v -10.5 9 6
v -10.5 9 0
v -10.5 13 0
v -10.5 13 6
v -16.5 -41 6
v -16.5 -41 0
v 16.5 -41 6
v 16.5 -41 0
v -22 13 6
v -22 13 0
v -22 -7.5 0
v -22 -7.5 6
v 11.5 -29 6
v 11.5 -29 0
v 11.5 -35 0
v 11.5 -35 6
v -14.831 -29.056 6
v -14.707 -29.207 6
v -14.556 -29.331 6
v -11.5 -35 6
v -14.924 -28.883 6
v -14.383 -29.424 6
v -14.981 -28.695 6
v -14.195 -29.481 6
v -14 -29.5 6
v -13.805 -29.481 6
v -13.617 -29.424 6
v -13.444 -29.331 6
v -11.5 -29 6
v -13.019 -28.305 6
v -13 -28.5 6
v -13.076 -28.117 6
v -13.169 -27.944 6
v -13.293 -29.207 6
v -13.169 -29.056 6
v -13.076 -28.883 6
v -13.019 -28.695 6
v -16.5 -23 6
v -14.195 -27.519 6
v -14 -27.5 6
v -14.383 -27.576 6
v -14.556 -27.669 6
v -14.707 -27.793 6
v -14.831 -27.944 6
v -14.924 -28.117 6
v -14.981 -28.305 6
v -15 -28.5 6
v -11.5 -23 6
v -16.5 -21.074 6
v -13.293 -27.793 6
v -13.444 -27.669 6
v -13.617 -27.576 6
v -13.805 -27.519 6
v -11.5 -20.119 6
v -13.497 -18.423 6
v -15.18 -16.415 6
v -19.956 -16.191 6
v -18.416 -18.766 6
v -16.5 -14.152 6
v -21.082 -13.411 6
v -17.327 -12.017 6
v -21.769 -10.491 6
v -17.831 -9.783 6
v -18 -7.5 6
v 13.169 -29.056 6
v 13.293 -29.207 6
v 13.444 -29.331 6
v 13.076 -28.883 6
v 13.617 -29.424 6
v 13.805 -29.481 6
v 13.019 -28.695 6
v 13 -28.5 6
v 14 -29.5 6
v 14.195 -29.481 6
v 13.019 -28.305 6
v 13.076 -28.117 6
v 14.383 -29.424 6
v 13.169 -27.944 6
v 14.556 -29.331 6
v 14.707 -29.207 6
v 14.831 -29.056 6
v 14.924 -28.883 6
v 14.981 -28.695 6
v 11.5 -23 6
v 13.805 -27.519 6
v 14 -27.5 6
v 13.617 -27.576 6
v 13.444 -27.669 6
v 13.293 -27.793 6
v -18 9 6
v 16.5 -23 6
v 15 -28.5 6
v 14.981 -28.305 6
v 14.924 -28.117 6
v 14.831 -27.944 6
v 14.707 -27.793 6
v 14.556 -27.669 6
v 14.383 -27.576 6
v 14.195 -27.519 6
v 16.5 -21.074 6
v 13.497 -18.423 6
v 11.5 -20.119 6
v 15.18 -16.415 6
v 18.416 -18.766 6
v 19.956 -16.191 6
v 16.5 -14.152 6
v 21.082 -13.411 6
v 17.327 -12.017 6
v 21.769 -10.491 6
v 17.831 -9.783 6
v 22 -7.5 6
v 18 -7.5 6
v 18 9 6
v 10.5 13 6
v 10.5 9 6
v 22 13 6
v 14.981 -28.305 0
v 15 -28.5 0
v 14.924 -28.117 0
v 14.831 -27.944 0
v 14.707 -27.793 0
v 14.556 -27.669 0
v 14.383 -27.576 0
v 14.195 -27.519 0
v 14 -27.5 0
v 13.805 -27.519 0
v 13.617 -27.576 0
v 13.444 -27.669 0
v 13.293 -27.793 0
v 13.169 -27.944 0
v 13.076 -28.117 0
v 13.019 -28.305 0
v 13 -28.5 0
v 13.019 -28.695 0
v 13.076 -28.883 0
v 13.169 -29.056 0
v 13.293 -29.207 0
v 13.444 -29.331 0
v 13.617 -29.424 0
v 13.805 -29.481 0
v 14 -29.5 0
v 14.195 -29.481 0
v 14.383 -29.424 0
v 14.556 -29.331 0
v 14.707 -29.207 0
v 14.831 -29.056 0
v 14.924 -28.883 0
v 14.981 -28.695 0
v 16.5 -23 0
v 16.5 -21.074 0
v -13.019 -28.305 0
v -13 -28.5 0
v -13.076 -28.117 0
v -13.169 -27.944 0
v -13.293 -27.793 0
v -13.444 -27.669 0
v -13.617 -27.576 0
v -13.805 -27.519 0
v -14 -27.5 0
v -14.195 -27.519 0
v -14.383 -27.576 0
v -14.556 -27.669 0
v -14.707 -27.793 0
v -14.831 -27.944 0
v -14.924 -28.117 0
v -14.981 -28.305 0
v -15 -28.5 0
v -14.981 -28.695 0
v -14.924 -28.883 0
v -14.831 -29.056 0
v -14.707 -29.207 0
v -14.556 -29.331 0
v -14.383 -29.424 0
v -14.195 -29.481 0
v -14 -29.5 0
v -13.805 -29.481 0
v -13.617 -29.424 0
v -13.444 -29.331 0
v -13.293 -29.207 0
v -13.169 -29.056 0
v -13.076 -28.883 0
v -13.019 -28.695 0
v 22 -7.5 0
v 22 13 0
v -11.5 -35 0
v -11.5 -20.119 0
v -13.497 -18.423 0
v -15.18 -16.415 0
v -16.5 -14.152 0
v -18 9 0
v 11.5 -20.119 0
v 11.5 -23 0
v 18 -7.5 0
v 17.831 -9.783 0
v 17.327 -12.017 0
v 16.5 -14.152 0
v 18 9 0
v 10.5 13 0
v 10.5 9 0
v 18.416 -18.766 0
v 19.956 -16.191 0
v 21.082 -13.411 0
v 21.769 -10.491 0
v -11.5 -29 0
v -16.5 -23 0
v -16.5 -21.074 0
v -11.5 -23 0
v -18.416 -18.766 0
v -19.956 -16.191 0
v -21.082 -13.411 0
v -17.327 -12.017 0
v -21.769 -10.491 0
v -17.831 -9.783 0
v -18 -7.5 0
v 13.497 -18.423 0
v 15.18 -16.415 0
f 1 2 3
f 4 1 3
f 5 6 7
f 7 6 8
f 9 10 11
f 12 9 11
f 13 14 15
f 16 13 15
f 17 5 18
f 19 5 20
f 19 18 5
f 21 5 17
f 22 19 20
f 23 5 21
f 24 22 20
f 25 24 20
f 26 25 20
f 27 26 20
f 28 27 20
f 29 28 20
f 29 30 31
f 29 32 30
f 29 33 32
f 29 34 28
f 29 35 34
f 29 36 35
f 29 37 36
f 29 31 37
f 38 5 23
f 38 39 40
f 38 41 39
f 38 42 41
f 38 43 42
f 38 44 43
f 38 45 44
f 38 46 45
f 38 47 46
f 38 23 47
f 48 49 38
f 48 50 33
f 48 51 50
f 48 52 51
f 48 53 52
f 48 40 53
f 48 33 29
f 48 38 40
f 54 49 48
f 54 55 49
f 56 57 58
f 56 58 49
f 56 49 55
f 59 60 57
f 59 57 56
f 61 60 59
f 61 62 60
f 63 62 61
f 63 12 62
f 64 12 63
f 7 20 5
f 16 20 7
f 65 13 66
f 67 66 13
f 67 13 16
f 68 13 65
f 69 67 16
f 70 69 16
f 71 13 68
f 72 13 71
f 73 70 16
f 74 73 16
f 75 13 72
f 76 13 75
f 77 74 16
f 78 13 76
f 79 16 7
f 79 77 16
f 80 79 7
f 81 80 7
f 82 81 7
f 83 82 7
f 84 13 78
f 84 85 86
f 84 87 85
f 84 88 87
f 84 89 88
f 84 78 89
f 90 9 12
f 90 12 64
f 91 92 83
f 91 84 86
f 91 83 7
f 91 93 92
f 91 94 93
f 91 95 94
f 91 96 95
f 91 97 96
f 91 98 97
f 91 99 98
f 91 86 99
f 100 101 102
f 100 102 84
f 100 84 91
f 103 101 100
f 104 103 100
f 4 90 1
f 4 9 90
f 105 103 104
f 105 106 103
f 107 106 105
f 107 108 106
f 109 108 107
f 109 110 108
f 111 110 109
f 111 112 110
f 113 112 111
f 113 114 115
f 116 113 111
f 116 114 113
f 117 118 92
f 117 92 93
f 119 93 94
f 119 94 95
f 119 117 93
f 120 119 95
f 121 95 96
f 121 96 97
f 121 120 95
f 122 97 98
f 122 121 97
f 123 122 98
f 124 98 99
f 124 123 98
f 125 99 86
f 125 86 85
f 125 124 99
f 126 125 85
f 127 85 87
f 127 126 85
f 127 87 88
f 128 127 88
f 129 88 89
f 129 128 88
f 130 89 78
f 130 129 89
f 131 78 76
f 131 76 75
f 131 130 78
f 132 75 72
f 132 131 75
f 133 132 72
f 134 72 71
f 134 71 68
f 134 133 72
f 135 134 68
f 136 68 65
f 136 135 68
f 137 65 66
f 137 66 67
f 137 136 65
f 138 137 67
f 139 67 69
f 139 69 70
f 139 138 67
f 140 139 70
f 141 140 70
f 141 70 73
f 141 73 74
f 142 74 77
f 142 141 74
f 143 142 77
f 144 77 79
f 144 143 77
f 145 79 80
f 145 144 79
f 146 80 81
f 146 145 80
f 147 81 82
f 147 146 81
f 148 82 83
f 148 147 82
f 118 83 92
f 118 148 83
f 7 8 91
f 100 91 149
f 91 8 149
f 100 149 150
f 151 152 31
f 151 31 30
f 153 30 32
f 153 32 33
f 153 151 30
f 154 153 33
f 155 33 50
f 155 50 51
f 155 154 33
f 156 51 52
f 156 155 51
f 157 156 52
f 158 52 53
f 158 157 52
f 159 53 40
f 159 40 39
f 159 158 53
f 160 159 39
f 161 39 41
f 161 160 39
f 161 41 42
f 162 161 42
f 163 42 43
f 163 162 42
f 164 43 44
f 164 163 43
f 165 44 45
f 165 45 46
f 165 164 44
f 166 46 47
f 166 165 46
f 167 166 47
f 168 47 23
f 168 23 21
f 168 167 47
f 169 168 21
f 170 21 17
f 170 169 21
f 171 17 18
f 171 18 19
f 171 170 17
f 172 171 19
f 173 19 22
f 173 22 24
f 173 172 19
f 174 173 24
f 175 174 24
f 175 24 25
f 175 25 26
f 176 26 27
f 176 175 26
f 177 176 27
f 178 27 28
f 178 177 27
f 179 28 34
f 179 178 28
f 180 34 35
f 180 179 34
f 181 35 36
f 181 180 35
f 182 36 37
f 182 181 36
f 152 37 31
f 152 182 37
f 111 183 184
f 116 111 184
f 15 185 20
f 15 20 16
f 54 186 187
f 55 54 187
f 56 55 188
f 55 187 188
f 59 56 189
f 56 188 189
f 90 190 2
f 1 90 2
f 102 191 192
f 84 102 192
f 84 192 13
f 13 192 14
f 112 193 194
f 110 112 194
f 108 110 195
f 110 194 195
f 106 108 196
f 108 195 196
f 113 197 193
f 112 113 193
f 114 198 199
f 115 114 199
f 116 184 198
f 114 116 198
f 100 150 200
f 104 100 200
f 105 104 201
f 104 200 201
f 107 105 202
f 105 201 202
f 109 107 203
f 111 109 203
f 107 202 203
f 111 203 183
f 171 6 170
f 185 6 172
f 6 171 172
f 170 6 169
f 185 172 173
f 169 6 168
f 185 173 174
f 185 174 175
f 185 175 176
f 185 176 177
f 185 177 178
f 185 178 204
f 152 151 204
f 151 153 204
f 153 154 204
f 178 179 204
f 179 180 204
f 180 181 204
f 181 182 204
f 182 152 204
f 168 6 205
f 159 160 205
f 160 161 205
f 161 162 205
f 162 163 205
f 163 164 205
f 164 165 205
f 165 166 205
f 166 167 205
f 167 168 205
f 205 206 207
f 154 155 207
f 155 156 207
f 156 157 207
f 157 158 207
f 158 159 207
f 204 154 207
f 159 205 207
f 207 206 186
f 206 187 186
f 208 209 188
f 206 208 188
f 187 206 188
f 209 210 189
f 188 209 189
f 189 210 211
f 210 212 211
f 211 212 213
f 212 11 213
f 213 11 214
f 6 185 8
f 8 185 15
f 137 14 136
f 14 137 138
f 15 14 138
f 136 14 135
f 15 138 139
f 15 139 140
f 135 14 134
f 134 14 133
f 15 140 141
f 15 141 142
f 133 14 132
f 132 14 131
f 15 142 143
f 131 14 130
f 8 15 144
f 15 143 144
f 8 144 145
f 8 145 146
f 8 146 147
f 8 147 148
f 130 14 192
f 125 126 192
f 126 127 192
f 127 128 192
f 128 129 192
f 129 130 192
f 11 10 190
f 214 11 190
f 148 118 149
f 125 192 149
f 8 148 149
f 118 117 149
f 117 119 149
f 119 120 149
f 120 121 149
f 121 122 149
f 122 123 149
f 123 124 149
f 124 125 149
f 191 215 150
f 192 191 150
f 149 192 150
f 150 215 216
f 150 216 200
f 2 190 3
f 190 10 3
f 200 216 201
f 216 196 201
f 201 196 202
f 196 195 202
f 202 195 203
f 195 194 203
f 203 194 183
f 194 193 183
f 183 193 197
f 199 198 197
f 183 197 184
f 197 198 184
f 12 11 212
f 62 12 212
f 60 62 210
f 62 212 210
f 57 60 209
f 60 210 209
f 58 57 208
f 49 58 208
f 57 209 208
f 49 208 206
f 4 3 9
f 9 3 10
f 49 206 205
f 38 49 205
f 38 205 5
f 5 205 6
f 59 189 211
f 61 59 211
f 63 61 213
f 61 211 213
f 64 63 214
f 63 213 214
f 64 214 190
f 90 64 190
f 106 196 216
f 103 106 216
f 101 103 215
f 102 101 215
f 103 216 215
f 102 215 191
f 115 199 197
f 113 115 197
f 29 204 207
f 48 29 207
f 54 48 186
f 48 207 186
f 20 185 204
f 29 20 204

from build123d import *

# Parameters (mm, degrees)
F0_R     = 1
F0_W     = 23
F0_H     = 6
F1_DEPTH = 6


# Not quite as in the source:
# - a feature names something its author has since deleted; it is built from what else it names


with BuildPart() as f1:
    # F0 (on Top) → F1 (new body)
    with BuildSketch(Plane.XY):
        with BuildLine():
            Line((-16.5, -21.0738723458), (-16.5, -14.1520673478))
            ThreePointArc((-16.5, -14.1520673478), (-17.620350525, -10.9095454242), (-18, -7.5))
            Line((-18, -7.5), (-18, 9))
            Line((-18, 9), (-10.5, 9))
            Line((-10.5, 9), (-10.5, 13.0000002682))
            Line((-10.5, 13.0000002682), (-22.0000002682, 13.0000002682))
            Line((-22.0000002682, 13.0000002682), (-22.0000002682, -7.5))
            ThreePointArc((-22.0000002682, -7.5), (-20.5727697686, -14.8229094869), (-16.5, -21.0738723458))
        make_face()
        with BuildLine():
            Line((14.3321600082, -23), (11.4999999106, -23))
            Line((11.5, -23), (11.5, -24.7988442176))
            ThreePointArc((11.4999999553, -24.7988442176), (12.9548401383, -23.9604473859), (14.3321600082, -23))
        make_face()
        with BuildLine():
            ThreePointArc((14.3321600082, -23), (12.9548401383, -23.9604473859), (11.4999999553, -24.7988442176))
            Line((11.5, -24.7988442176), (11.5, -29))
            Line((11.4999999106, -29), (11.4999999106, -35))
            Line((11.4999999106, -35), (11.4999999106, -41))
            Line((11.4999999106, -41), (16.4999999106, -41))
            Line((16.4999999106, -41), (16.4999999106, -23))
            Line((16.4999999106, -23), (14.3321600082, -23))
        make_face()
        with Locations((14, -28.5)):
            Circle(F0_R, mode=Mode.SUBTRACT)
        with BuildLine():
            ThreePointArc((18, -7.5), (17.620350525, -10.9095454242), (16.5, -14.1520673478))
            Line((16.5, -14.1520673478), (16.5, -21.0738723458))
            ThreePointArc((16.5, -21.0738723458), (20.5727697686, -14.8229094869), (22.0000002682, -7.5))
            Line((22.0000002682, -7.5), (22.0000002682, 13.0000002682))
            Line((22.0000002682, 13.0000002682), (10.5, 13.0000002682))
            Line((10.5, 13.0000002682), (10.5, 9))
            Line((10.5, 9), (18, 9))
            Line((18, 9), (18, -7.5))
        make_face()
        with BuildLine():
            Line((-11.5, -24.7988441711), (-11.5, -23))
            Line((-11.5000000894, -23), (-14.3321600082, -23))
            ThreePointArc((-14.3321600082, -23), (-12.9548401808, -23.9604473589), (-11.5000000447, -24.7988441711))
        make_face()
        with BuildLine():
            Line((-11.5, -29), (-11.5, -24.7988441711))
            ThreePointArc((-11.5000000447, -24.7988441711), (-12.9548401808, -23.9604473589), (-14.3321600082, -23))
            Line((-14.3321600082, -23), (-16.5000000894, -23))
            Line((-16.5000000894, -23), (-16.5000000894, -41))
            Line((-16.5000000894, -41), (-11.5000000894, -41))
            Line((-11.5000000894, -41), (-11.5000000894, -35))
            Line((-11.5000000894, -35), (-11.5000000894, -29))
        make_face()
        with Locations((-14, -28.5)):
            Circle(F0_R, mode=Mode.SUBTRACT)
        with BuildLine():
            Line((-16.5000000894, -23), (-14.3321600082, -23))
            ThreePointArc((-14.3321600082, -23), (-15.4519347824, -22.0772904153), (-16.5, -21.0738723458))
            Line((-16.5, -21.0738723458), (-16.5, -23))
        make_face()
        with Locations((-8.94e-08, -38)):
            Rectangle(F0_W, F0_H)
        with BuildLine():
            ThreePointArc((16.5, -21.0738723458), (15.4519347824, -22.0772904153), (14.3321600082, -23))
            Line((14.3321600082, -23), (16.4999999106, -23))
            Line((16.5, -23), (16.5, -21.0738723458))
        make_face()
        with BuildLine():
            ThreePointArc((16.5, -14.1520673478), (14.3807555592, -17.4547801253), (11.5, -20.1194294641))
            Line((11.5, -20.1194294641), (11.5, -23))
            Line((11.4999999106, -23), (14.3321600082, -23))
            ThreePointArc((14.3321600082, -23), (15.4519347824, -22.0772904153), (16.5, -21.0738723458))
            Line((16.5, -21.0738723458), (16.5, -14.1520673478))
        make_face()
        with BuildLine():
            Line((-11.5, -23), (-11.5, -20.1194294641))
            ThreePointArc((-11.5, -20.1194294641), (-14.3807555592, -17.4547801253), (-16.5, -14.1520673478))
            Line((-16.5, -14.1520673478), (-16.5, -21.0738723458))
            ThreePointArc((-16.5, -21.0738723458), (-15.4519347824, -22.0772904153), (-14.3321600082, -23))
            Line((-14.3321600082, -23), (-11.5000000894, -23))
        make_face()
    extrude(amount=F1_DEPTH)


solid = f1.part
